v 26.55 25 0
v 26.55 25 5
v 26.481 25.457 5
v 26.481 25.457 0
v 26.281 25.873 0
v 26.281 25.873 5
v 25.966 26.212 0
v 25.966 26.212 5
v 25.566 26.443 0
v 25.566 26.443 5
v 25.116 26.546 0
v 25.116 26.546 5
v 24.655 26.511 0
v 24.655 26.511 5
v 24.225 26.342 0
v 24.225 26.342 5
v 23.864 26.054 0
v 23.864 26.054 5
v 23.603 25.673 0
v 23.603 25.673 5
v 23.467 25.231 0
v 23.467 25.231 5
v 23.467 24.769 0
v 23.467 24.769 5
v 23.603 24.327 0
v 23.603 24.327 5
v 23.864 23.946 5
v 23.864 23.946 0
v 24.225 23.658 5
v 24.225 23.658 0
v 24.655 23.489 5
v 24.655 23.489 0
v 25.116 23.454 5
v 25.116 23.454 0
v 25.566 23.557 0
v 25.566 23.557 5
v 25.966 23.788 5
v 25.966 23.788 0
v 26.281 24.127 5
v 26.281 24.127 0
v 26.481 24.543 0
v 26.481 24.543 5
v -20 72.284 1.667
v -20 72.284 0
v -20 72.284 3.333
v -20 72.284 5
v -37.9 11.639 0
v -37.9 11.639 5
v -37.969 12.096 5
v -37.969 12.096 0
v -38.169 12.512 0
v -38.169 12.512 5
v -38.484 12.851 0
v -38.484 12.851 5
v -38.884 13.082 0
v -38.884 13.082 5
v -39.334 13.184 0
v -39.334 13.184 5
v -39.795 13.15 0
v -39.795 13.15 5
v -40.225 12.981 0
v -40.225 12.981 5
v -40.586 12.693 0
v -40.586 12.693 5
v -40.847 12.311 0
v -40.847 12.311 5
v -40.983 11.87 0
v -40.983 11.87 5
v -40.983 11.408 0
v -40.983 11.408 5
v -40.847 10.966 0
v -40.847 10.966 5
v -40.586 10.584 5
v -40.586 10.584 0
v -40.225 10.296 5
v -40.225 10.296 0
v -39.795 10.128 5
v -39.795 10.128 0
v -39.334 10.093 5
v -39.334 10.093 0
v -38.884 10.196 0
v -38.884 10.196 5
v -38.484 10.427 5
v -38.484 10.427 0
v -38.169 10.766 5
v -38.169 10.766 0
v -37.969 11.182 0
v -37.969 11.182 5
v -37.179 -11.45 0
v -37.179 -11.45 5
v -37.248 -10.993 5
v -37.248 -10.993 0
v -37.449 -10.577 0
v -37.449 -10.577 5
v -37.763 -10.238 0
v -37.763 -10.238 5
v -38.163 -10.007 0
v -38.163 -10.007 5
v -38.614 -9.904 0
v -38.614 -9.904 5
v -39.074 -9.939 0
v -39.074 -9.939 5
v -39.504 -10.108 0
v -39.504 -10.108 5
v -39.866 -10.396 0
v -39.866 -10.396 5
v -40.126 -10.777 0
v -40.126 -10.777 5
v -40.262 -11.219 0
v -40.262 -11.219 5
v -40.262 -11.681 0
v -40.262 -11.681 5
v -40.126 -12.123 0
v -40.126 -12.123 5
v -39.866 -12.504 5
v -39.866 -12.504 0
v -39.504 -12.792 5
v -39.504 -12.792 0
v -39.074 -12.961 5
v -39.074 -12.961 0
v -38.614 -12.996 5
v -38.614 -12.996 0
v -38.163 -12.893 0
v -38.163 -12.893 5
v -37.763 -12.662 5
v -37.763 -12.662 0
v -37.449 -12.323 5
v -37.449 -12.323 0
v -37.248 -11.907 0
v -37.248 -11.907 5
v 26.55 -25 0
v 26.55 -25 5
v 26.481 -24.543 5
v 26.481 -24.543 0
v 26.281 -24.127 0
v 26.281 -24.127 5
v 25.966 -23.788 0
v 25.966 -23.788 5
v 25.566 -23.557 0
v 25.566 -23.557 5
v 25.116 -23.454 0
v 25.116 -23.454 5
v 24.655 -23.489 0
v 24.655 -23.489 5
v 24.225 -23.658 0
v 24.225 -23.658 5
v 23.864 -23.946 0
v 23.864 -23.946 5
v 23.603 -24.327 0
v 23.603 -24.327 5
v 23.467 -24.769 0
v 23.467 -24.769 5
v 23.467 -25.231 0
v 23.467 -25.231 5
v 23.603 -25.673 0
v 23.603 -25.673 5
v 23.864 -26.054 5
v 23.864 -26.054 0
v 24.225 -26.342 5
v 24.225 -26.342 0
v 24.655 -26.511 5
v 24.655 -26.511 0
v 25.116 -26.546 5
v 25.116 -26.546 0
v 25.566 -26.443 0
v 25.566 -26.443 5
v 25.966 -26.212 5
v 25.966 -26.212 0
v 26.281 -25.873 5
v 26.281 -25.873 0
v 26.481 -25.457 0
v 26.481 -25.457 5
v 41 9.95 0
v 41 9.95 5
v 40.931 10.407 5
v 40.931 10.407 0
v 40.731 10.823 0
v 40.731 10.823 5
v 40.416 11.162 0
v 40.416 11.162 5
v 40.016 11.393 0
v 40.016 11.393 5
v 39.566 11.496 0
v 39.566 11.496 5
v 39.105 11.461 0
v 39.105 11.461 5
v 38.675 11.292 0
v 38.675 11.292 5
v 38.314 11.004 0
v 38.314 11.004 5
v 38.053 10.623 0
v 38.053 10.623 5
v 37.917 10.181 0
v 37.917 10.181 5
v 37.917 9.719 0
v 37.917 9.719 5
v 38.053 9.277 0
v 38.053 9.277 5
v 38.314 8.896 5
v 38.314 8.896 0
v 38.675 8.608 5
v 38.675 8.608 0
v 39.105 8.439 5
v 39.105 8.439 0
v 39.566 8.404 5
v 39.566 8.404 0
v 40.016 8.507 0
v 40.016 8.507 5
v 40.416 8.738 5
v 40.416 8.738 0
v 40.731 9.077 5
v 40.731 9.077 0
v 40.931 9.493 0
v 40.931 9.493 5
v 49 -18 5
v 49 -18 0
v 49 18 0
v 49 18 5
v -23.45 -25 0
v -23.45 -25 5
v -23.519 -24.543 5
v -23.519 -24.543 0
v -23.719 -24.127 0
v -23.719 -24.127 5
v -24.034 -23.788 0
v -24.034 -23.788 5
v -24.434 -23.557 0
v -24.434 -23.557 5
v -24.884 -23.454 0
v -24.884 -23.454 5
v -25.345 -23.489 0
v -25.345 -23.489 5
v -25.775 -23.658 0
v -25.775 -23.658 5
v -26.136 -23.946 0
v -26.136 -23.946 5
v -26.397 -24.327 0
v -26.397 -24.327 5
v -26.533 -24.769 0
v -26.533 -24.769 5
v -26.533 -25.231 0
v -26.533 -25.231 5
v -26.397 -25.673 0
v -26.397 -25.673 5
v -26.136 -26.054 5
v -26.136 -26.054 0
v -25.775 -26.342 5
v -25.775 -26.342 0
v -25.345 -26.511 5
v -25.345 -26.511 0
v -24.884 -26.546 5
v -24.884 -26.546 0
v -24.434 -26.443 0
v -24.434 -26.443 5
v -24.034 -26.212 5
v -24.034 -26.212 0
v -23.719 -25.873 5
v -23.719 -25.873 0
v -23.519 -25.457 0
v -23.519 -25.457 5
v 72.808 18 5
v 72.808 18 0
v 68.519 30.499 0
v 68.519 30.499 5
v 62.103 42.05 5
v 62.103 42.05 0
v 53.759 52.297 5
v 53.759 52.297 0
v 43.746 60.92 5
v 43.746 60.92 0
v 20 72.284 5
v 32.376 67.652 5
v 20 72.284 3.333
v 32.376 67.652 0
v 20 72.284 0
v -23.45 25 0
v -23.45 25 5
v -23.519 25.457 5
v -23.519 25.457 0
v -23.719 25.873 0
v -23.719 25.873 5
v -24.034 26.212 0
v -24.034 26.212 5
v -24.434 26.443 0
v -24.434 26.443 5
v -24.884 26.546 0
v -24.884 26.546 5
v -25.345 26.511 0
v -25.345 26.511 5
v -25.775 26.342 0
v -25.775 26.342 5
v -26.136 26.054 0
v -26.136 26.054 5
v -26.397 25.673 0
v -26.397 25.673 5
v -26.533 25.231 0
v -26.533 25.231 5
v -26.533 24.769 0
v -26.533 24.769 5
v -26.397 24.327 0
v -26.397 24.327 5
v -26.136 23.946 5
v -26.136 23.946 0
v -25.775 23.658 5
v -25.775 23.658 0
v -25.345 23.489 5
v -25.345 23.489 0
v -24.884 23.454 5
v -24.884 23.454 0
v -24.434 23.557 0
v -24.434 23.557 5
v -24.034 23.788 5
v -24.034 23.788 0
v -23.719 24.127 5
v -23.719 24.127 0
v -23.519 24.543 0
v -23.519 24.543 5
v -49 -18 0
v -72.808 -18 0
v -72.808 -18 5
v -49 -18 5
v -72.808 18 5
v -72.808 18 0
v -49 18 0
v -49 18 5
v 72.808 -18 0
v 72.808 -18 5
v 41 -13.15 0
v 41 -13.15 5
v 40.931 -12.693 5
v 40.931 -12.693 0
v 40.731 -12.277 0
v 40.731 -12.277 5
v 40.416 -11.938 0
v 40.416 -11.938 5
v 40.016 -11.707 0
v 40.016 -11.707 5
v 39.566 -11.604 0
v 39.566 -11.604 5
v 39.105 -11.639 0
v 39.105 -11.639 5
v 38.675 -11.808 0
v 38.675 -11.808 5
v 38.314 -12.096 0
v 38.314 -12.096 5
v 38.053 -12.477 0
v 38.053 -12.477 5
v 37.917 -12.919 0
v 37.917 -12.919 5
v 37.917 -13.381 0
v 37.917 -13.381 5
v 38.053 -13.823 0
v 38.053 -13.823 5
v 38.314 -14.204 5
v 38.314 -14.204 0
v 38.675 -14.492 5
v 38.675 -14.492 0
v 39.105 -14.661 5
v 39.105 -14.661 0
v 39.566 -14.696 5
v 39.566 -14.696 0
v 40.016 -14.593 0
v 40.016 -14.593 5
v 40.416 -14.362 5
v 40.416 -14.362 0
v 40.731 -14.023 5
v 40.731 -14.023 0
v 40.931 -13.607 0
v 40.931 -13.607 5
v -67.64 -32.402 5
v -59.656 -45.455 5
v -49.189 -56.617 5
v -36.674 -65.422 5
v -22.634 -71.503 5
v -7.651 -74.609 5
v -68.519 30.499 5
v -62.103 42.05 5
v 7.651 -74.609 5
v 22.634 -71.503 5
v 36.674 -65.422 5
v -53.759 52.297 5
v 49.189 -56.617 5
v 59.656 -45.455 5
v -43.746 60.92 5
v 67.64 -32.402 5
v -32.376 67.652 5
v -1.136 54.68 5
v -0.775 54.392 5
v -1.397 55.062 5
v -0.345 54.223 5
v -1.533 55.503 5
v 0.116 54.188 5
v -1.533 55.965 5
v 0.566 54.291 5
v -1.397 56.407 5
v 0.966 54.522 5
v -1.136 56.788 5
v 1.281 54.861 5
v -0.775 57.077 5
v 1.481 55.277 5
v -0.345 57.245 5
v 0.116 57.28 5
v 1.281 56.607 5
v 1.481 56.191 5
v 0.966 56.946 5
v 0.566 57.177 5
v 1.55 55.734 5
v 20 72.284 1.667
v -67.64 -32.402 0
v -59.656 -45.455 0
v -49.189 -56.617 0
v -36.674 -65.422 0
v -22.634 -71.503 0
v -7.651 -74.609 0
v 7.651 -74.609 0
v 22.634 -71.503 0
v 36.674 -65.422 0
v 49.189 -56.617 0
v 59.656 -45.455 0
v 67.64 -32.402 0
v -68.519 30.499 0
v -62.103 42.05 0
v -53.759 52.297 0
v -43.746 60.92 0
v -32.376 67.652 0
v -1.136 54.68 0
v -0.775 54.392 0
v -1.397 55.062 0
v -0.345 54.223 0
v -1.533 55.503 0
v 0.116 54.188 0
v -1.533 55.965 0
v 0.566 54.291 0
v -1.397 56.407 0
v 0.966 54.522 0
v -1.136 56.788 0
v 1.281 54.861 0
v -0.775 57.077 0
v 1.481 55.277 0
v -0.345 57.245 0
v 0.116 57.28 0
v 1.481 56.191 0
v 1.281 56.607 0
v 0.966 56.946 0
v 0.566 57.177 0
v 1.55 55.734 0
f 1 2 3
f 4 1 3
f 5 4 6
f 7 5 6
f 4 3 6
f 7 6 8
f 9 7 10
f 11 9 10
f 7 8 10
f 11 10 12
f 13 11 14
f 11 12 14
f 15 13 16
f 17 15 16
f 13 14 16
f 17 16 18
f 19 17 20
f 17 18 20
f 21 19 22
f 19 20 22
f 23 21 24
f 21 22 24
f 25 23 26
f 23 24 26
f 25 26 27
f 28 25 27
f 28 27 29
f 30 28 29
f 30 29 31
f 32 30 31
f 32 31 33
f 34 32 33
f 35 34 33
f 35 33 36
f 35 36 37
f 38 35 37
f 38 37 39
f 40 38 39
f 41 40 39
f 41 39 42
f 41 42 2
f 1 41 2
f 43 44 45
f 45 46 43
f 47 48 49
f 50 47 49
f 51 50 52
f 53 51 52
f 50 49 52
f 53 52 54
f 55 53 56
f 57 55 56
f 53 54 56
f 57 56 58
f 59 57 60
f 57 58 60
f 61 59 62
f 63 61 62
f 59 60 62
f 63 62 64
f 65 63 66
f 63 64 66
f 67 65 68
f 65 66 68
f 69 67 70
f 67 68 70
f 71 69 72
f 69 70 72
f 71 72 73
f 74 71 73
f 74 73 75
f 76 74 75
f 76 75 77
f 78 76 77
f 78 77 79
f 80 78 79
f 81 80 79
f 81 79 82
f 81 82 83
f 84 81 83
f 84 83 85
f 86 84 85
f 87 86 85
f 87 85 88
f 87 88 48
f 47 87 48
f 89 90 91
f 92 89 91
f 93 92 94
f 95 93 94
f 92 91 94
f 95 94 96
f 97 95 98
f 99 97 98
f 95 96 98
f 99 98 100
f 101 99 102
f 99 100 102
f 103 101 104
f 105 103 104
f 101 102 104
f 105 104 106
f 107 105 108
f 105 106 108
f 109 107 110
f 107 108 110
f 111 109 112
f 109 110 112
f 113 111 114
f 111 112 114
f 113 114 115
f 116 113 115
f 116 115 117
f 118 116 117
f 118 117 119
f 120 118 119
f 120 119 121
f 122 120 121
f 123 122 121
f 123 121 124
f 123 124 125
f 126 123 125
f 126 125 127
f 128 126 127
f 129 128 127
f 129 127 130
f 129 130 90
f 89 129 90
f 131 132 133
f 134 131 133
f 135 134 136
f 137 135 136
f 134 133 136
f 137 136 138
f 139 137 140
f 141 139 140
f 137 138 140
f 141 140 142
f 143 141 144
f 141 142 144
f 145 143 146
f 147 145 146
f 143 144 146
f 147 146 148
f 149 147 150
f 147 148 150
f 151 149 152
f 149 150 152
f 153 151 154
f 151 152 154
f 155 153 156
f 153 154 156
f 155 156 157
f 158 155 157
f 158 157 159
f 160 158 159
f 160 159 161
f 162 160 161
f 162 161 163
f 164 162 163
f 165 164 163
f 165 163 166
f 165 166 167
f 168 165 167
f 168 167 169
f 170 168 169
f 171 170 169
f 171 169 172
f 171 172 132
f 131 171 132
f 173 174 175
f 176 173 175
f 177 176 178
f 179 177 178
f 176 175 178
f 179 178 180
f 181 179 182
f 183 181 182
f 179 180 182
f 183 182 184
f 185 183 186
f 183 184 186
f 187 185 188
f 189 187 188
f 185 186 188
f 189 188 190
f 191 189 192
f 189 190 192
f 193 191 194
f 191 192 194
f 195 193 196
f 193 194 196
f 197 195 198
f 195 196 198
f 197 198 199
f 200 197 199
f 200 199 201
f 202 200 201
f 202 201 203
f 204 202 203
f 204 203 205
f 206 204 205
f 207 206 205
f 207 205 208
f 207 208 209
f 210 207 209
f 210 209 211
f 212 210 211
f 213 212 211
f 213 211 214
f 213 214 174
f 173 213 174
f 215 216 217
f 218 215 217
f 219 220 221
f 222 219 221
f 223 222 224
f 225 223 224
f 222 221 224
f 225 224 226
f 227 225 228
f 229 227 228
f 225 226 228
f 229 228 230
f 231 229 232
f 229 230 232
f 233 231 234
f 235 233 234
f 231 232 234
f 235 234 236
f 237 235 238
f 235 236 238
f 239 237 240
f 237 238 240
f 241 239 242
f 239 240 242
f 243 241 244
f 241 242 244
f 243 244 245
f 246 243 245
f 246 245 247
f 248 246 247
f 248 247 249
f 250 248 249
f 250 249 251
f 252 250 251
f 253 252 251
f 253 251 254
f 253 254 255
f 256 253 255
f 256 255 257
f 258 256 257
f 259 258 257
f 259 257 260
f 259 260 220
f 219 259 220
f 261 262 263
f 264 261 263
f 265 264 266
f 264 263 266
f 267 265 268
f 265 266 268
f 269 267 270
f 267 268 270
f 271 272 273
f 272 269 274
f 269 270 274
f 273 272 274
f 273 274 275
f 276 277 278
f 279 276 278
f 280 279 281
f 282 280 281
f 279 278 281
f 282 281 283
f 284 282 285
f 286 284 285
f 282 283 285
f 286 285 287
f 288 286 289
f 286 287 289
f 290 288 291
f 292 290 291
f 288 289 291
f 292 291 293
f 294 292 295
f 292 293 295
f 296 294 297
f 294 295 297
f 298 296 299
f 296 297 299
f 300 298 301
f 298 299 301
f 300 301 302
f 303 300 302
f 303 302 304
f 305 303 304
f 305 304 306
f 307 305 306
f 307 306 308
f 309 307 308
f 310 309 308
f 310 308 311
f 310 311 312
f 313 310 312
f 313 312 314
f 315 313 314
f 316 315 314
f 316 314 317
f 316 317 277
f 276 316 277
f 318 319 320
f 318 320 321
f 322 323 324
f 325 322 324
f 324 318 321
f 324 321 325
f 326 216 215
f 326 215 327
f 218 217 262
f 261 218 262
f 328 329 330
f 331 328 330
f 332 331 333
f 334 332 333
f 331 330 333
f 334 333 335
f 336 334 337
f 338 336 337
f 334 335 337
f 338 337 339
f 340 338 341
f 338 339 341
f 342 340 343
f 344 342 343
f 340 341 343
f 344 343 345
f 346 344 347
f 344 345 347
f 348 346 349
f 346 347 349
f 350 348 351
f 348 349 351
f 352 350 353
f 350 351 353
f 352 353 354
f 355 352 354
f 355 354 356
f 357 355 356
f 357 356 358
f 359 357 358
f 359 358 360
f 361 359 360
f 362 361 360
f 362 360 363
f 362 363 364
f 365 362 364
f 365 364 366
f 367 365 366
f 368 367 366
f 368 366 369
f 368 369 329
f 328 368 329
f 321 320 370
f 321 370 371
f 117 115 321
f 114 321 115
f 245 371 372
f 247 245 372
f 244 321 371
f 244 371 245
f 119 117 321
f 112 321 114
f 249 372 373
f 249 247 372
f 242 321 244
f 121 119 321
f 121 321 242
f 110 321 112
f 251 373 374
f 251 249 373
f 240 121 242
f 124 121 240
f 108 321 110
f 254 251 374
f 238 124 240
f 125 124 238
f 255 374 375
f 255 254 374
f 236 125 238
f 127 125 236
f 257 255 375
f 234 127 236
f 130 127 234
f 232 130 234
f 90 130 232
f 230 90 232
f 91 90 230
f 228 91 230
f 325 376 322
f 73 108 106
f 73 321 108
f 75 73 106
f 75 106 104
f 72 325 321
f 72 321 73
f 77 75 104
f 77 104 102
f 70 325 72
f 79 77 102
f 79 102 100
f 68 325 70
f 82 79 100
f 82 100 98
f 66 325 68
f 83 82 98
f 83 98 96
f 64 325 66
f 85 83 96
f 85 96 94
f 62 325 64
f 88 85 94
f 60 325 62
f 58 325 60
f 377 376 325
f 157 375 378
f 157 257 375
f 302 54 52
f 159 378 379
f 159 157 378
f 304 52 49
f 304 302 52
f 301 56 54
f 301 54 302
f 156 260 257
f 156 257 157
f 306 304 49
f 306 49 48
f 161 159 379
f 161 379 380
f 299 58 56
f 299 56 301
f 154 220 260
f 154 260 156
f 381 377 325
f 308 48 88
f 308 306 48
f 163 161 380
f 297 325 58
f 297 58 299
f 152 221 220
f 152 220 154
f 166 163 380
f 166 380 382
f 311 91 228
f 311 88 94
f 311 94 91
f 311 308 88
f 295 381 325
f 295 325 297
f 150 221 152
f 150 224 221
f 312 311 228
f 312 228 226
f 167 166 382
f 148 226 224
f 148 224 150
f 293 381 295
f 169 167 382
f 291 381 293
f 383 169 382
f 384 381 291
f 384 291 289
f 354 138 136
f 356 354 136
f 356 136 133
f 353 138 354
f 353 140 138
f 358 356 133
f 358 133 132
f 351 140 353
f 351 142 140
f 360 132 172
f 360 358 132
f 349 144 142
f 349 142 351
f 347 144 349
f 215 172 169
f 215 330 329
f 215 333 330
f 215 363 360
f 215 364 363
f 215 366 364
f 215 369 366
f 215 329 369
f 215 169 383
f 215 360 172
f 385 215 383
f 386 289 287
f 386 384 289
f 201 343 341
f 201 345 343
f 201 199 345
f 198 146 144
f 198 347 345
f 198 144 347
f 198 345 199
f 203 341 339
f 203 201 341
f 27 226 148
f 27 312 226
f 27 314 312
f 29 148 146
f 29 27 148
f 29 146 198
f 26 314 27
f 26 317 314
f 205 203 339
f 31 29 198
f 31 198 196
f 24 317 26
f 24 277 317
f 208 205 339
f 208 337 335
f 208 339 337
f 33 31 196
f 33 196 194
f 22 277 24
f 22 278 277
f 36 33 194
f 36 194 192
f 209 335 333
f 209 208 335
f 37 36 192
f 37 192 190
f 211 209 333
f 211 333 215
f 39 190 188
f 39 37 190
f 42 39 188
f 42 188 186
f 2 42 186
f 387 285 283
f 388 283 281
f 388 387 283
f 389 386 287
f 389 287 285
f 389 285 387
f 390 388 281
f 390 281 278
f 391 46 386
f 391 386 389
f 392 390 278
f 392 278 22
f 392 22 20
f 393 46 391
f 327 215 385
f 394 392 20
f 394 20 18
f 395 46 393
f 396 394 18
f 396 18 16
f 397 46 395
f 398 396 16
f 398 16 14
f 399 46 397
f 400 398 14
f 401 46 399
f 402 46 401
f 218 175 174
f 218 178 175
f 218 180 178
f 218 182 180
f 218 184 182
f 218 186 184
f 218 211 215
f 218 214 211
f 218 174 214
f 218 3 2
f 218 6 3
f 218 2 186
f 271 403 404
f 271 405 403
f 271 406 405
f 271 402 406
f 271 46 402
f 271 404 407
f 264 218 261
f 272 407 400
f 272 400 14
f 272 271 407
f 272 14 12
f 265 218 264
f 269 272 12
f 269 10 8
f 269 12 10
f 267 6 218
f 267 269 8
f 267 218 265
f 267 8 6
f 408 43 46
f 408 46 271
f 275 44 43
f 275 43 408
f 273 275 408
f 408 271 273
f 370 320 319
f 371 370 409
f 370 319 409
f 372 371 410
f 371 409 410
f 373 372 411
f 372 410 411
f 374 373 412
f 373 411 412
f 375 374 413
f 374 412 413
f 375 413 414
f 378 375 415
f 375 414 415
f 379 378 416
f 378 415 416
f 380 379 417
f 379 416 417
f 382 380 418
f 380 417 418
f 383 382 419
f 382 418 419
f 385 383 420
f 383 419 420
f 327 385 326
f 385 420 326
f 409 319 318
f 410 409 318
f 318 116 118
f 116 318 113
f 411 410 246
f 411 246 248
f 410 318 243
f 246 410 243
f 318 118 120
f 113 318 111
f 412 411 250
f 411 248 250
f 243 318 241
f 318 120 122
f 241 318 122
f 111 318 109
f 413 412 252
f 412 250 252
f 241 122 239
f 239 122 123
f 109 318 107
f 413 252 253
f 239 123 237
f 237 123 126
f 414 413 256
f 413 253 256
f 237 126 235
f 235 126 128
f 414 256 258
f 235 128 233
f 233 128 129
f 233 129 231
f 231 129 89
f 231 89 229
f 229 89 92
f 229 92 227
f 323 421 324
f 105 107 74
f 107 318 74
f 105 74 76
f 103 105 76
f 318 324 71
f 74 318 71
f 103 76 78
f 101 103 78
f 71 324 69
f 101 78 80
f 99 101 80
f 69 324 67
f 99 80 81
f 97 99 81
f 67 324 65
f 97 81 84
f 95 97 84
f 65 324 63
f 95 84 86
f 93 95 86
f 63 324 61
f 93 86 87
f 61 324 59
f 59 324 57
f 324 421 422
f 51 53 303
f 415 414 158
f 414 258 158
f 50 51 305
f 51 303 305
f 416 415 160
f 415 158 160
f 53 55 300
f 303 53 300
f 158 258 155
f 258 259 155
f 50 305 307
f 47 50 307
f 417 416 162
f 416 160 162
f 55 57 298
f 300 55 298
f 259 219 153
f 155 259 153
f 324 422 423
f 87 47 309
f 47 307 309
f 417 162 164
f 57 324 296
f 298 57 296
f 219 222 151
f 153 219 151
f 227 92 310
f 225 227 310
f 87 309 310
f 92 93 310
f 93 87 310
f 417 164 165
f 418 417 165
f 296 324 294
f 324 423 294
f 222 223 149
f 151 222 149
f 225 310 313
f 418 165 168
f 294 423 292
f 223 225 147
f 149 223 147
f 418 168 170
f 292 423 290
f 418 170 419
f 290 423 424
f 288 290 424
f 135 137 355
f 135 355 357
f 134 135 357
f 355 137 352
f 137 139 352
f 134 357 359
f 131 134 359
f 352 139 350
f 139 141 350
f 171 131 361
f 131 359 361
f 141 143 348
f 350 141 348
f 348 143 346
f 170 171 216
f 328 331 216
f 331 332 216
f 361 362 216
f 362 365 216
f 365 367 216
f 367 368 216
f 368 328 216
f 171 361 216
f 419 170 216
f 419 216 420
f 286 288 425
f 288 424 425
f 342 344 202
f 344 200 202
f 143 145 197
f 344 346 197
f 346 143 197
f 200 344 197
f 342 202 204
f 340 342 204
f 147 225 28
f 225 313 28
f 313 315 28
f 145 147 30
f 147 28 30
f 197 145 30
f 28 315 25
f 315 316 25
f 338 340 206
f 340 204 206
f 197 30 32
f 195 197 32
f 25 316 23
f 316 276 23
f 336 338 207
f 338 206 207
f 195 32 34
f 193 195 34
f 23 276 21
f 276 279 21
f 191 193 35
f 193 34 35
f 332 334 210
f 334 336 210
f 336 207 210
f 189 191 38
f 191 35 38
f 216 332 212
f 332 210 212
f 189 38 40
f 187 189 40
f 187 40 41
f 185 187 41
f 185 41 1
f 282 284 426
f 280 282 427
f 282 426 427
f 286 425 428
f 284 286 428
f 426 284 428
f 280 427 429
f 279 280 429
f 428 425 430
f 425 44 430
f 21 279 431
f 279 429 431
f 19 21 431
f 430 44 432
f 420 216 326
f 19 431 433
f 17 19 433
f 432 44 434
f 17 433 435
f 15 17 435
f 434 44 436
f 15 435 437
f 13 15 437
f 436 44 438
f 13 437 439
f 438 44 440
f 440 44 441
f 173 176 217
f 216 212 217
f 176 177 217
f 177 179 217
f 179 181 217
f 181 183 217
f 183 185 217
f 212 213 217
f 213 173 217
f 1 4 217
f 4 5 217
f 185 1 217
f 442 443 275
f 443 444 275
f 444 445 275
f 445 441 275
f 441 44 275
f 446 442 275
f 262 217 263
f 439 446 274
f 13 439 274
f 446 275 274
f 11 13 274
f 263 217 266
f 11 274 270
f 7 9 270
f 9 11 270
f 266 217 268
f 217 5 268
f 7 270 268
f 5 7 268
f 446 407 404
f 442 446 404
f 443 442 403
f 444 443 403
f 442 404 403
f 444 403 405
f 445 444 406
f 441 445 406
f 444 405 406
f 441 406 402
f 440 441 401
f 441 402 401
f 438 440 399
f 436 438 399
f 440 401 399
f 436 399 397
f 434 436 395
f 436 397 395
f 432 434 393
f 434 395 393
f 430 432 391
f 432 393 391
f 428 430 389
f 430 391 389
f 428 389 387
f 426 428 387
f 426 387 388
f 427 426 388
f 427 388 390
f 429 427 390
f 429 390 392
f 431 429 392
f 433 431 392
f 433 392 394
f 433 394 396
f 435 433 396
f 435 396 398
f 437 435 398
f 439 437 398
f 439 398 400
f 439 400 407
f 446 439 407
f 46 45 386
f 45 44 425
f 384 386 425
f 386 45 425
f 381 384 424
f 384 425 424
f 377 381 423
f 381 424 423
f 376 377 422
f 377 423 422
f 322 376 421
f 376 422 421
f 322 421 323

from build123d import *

# Parameters (mm, degrees)
F0_R      = 75
F1_DEPTH  = 5
F2_W      = 26
F2_H      = 36
F3_DEPTH  = 25
F4_W      = 26
F4_H      = 36
F5_DEPTH  = 25
F6_W      = 40
F6_H      = 5.71822
F7_DEPTH  = 25
F8_R      = 1.55
F9_DEPTH  = 25
F10_R     = 1.55
F11_DEPTH = 25
F12_R     = 1.55
F13_DEPTH = 25
F14_R     = 1.55
F15_DEPTH = 25


with BuildPart() as f1:
    # F0 (on Top) → F1 (new body)
    with BuildSketch(Plane.XY):
        Circle(F0_R)
    extrude(amount=F1_DEPTH)

    # F2 (on Top) → F3 (cut)
    with BuildSketch(Plane.XY):
        with Locations((62, 0)):
            Rectangle(F2_W, F2_H)
    extrude(amount=F3_DEPTH, mode=Mode.SUBTRACT)

    # F4 (on Top) → F5 (cut)
    with BuildSketch(Plane.XY):
        with Locations((-62, 0)):
            Rectangle(F4_W, F4_H)
    extrude(amount=F5_DEPTH, mode=Mode.SUBTRACT)

    # F6 (on Top) → F7 (cut)
    with BuildSketch(Plane.XY):
        with Locations((0, 75.143271)):
            Rectangle(F6_W, F6_H)
    extrude(amount=F7_DEPTH, mode=Mode.SUBTRACT)

    # F8 (on face) → F9 (cut)
    with BuildSketch(Plane.XY.offset(5)):
        with Locations((-25, -25)):
            Circle(F8_R)
        with Locations((-25, 25)):
            Circle(F8_R)
        with Locations((25, 25)):
            Circle(F8_R)
        with Locations((25, -25)):
            Circle(F8_R)
    extrude(amount=-F9_DEPTH, mode=Mode.SUBTRACT)

    # F10 (on face) → F11 (cut)
    with BuildSketch(Plane.XY.offset(5)):
        with Locations((39.45, 9.95)):
            Circle(F10_R)
        with Locations((39.45, -13.15)):
            Circle(F10_R)
    extrude(amount=-F11_DEPTH, mode=Mode.SUBTRACT)

    # F12 (on face) → F13 (cut)
    with BuildSketch(Plane.XY.offset(5)):
        with Locations((-39.45, 11.638757)):
            Circle(F12_R)
        with Locations((-38.729364, -11.45)):
            Circle(F12_R)
    extrude(amount=-F13_DEPTH, mode=Mode.SUBTRACT)

    # F14 (on face) → F15 (cut)
    with BuildSketch(Plane.XY.offset(5)):
        with Locations((0, 55.734161)):
            Circle(F14_R)
    extrude(amount=-F15_DEPTH, mode=Mode.SUBTRACT)


solid = f1.part
